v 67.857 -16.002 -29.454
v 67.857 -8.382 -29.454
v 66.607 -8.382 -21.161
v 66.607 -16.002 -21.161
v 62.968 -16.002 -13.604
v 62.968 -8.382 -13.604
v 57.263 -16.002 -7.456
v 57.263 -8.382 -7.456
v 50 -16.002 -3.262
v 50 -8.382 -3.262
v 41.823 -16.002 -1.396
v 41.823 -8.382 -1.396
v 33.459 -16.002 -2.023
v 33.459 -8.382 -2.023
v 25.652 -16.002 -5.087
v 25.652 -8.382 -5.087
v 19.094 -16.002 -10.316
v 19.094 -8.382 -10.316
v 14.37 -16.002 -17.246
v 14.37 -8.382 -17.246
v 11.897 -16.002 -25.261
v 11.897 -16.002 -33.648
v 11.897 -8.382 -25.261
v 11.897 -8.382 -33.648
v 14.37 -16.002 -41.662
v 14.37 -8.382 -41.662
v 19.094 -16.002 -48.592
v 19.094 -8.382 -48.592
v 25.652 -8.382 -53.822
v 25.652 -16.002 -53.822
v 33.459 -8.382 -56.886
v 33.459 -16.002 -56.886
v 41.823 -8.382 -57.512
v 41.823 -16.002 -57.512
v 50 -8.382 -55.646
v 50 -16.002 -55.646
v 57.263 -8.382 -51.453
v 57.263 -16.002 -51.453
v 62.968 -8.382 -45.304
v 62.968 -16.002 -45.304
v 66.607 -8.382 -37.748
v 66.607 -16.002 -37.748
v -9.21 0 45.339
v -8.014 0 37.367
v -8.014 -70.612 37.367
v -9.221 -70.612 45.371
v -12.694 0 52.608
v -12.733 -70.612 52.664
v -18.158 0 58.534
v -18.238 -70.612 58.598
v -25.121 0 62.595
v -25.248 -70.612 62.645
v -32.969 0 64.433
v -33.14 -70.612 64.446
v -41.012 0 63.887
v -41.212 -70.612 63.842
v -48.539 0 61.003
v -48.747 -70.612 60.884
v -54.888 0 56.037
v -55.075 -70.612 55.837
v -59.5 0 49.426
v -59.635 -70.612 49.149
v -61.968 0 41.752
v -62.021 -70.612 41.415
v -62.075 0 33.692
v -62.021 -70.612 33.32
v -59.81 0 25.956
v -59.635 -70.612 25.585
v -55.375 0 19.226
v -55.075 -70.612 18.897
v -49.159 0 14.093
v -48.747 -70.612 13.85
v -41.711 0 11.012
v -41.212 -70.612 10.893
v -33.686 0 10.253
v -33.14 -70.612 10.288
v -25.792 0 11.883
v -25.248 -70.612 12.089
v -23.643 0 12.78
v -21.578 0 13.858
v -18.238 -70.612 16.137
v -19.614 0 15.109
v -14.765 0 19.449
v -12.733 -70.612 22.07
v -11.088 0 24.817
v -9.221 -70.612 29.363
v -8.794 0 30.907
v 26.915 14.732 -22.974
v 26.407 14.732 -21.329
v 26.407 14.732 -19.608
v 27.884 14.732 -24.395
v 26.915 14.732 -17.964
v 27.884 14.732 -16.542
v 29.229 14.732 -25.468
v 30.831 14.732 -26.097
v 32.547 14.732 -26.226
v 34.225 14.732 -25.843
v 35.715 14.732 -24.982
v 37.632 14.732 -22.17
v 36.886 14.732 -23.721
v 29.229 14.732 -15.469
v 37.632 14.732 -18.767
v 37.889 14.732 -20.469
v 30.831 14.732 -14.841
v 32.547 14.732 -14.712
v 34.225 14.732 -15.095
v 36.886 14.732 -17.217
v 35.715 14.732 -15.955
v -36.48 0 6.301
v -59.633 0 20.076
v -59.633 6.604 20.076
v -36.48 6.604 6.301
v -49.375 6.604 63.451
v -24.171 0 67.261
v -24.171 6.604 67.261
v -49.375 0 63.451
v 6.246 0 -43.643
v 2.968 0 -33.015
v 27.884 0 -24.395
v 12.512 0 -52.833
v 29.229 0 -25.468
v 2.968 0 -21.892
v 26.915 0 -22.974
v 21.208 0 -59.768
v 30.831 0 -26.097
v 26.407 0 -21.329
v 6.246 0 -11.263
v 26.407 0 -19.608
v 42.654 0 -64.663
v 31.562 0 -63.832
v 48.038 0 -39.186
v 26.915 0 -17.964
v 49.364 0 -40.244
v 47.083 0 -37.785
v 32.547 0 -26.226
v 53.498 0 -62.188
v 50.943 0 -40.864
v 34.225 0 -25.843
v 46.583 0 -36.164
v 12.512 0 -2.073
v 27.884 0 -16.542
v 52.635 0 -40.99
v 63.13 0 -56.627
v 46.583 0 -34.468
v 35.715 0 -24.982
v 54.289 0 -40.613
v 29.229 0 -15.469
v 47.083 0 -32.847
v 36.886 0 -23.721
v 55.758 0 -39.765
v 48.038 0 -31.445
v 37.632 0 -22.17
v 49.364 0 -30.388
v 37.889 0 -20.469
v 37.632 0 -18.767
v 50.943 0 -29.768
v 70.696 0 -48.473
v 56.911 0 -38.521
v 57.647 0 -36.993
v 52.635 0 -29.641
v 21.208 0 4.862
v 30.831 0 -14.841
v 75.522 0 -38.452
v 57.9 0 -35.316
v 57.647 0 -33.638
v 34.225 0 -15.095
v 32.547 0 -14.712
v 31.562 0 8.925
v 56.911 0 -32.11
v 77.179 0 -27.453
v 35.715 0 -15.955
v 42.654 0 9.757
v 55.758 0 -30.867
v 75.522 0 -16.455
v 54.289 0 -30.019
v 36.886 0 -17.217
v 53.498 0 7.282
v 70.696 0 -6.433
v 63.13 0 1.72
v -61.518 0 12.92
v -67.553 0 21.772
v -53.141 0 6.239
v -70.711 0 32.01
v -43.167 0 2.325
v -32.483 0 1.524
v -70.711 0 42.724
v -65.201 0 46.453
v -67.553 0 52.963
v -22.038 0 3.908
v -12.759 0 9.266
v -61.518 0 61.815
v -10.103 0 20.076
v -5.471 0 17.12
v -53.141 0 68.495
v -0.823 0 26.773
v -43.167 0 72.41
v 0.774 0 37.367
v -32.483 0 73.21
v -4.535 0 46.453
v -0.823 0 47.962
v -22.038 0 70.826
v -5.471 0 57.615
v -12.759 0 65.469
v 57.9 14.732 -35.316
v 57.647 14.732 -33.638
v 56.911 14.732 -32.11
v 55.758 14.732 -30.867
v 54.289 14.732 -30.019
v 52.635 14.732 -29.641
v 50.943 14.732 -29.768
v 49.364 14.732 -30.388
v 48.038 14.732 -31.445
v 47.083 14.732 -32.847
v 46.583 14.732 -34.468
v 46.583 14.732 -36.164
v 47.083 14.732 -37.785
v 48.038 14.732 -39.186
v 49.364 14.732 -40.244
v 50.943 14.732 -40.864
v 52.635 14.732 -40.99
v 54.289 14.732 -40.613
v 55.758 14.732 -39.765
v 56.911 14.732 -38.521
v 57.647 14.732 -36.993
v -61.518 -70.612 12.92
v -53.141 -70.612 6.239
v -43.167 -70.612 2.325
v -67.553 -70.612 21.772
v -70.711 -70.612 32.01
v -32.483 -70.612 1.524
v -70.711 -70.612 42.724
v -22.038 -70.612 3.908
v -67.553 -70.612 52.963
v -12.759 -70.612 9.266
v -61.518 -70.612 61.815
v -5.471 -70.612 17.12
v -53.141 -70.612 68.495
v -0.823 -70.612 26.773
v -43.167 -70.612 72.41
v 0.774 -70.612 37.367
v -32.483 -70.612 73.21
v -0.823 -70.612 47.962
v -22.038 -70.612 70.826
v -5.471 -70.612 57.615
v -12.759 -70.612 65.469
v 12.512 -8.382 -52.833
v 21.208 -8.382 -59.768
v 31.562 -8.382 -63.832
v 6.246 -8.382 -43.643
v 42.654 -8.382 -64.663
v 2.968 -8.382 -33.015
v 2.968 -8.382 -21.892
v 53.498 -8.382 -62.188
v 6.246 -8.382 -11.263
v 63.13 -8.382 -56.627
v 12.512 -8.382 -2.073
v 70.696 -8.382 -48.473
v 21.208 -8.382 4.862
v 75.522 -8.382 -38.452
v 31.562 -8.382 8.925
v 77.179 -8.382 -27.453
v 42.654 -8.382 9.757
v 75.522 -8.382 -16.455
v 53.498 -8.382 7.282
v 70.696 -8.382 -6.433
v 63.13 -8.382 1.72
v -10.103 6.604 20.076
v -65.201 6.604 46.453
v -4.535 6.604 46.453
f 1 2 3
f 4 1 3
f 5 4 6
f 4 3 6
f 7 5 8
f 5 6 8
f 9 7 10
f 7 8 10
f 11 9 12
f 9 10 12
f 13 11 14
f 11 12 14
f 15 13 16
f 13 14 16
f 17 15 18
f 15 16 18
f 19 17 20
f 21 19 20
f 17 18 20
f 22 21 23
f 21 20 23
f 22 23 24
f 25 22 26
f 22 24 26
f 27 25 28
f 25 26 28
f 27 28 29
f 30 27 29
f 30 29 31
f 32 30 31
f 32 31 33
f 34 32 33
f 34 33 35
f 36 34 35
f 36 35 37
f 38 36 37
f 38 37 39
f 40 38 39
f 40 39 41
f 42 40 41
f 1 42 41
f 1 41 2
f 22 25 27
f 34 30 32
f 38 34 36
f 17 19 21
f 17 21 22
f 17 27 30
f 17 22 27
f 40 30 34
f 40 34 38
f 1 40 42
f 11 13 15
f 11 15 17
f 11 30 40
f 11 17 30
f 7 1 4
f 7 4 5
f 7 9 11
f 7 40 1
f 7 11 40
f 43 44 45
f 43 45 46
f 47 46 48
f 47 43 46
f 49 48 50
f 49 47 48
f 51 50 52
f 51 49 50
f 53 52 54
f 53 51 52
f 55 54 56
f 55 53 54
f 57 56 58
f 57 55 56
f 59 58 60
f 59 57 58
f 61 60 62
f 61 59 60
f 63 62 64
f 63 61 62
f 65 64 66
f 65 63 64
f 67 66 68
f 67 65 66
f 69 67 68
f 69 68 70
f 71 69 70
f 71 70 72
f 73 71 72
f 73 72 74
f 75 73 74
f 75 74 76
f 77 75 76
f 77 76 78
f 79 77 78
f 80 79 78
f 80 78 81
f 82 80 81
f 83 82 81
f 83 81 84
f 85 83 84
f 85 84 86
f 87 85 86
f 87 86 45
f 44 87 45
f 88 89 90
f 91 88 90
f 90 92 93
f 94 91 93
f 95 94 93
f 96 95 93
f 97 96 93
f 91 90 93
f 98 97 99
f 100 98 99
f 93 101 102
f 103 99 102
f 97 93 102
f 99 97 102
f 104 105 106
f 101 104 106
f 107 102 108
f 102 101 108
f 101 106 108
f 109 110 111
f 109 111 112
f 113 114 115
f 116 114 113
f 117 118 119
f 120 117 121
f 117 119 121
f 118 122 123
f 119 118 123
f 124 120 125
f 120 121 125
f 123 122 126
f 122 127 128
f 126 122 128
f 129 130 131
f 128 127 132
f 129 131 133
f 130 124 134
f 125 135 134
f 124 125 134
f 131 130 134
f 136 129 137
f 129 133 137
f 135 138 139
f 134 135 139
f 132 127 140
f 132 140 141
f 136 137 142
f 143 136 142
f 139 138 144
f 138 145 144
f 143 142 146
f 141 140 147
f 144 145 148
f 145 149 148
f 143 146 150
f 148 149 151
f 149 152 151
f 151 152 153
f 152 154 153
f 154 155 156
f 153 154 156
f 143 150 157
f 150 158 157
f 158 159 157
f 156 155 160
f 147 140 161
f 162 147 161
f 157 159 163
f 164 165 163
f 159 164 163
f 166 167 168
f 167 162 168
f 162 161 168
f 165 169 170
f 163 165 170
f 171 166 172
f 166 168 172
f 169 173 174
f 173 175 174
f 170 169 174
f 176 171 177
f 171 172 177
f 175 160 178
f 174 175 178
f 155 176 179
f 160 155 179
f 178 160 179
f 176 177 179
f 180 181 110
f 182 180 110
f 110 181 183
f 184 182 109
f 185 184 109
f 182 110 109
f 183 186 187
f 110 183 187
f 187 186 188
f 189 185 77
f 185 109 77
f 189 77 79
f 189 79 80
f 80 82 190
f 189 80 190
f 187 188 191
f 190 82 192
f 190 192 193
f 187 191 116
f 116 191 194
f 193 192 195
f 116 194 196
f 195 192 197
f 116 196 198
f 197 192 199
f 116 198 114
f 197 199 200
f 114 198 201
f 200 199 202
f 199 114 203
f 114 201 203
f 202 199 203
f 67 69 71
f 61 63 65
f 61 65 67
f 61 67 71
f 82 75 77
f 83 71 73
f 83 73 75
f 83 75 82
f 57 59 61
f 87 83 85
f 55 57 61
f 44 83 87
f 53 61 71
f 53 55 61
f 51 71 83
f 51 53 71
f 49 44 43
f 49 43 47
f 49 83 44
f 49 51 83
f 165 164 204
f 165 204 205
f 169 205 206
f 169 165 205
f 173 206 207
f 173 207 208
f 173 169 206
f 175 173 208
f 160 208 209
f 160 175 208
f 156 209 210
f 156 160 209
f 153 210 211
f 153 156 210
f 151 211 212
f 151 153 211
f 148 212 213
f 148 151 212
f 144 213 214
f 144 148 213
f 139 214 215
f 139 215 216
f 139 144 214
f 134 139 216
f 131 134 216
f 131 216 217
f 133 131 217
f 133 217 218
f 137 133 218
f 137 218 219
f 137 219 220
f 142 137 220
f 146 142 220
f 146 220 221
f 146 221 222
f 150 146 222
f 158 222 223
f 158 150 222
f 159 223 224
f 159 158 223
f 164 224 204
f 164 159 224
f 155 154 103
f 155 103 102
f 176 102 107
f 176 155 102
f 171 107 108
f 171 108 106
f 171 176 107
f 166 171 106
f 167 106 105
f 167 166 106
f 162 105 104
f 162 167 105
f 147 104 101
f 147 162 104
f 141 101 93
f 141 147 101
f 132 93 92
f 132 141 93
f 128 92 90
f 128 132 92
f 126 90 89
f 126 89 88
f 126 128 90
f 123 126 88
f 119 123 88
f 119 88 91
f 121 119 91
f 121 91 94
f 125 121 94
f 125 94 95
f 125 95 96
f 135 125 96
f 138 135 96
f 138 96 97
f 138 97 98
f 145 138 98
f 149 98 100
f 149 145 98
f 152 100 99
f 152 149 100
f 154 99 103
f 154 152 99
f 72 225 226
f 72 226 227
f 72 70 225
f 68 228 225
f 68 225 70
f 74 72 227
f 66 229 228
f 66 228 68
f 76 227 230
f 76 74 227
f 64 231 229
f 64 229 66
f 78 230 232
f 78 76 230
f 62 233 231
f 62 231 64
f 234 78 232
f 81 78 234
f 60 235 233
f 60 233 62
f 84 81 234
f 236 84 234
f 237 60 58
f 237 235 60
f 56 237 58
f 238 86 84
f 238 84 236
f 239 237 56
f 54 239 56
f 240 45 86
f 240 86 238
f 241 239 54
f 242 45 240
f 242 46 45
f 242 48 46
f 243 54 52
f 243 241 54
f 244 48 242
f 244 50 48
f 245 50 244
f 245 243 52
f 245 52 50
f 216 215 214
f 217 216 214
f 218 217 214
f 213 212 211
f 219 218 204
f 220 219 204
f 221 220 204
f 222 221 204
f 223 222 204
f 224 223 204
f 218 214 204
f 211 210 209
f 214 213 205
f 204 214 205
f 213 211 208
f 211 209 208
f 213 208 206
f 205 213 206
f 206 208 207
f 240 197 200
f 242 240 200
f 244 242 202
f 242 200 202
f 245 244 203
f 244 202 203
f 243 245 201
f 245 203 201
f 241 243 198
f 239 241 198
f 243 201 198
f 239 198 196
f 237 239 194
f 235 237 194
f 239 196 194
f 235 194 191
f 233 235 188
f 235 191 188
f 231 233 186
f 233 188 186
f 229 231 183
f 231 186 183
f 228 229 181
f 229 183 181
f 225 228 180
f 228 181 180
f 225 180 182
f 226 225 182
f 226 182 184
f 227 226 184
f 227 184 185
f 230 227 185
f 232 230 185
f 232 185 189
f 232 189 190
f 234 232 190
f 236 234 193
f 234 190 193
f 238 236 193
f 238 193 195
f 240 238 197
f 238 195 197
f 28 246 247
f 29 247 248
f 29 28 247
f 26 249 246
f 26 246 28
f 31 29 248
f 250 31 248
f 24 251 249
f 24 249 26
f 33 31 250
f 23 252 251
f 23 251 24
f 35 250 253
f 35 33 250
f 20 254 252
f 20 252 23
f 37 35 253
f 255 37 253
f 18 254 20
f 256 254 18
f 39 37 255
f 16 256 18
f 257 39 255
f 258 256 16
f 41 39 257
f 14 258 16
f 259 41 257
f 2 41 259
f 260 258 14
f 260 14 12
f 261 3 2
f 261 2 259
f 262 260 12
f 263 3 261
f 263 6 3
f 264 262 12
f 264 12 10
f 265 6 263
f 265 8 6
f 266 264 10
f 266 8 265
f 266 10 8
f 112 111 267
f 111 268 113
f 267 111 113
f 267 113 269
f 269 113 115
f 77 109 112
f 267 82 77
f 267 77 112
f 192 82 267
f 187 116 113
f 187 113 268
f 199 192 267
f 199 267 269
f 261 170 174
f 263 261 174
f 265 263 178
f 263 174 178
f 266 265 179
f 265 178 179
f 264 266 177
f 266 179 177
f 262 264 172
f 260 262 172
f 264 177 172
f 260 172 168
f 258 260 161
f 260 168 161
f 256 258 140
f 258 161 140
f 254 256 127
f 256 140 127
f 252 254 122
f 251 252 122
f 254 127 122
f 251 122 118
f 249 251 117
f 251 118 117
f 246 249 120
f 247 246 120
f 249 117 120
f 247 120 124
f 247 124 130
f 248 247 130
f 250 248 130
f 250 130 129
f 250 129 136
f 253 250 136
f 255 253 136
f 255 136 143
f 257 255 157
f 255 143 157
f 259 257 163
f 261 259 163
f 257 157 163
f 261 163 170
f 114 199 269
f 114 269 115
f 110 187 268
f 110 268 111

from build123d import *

# Parameters (mm, degrees)
F0_R     = 35.943467
F0_R_2   = 27.155122
F1_DEPTH = 70.612
F3_DEPTH = 6.604
F4_R     = 37.314114
F5_DEPTH = 8.382
F6_R     = 28.136915
F7_DEPTH = 16.002
F8_R     = 5.772947
F8_R_2   = 5.690523
F9_DEPTH = 14.732


with BuildPart() as f1:
    # F0 (on Front) → F1 (new body)
    with BuildSketch(Plane.XZ):
        with Locations((-35.169233, 37.367307)):
            Circle(F0_R)
        with Locations((-35.169233, 37.367307)):
            Circle(F0_R_2, mode=Mode.SUBTRACT)
    extrude(amount=F1_DEPTH)

    # F2 (on Front) → F3 (join)
    with BuildSketch(Plane.XZ):
        Polygon((-24.170674, 67.261152), (-49.375292, 63.451156), (-65.201446, 46.452694), (-59.632983, 20.07577), (-36.479905, 6.301154), (-10.102982, 20.07577), (-4.534521, 46.452694), align=None)
    extrude(amount=-F3_DEPTH)


with BuildPart() as f5:
    # F4 (on Front) → F5 (new body)
    with BuildSketch(Plane.XZ):
        with Locations((39.865295, -27.453179)):
            Circle(F4_R)
    extrude(amount=F5_DEPTH)

    # F6 (on Front) → F7 (join)
    with BuildSketch(Plane.XZ):
        with Locations((39.720099, -29.454231)):
            Circle(F6_R)
    extrude(amount=F7_DEPTH)

    # F8 (on Front) → F9 (join)
    with BuildSketch(Plane.XZ):
        with Locations((32.115912, -20.468854)):
            Circle(F8_R)
        with Locations((52.209612, -35.315771)):
            Circle(F8_R_2)
    extrude(amount=-F9_DEPTH)


solid = Compound([f1.part, f5.part])
